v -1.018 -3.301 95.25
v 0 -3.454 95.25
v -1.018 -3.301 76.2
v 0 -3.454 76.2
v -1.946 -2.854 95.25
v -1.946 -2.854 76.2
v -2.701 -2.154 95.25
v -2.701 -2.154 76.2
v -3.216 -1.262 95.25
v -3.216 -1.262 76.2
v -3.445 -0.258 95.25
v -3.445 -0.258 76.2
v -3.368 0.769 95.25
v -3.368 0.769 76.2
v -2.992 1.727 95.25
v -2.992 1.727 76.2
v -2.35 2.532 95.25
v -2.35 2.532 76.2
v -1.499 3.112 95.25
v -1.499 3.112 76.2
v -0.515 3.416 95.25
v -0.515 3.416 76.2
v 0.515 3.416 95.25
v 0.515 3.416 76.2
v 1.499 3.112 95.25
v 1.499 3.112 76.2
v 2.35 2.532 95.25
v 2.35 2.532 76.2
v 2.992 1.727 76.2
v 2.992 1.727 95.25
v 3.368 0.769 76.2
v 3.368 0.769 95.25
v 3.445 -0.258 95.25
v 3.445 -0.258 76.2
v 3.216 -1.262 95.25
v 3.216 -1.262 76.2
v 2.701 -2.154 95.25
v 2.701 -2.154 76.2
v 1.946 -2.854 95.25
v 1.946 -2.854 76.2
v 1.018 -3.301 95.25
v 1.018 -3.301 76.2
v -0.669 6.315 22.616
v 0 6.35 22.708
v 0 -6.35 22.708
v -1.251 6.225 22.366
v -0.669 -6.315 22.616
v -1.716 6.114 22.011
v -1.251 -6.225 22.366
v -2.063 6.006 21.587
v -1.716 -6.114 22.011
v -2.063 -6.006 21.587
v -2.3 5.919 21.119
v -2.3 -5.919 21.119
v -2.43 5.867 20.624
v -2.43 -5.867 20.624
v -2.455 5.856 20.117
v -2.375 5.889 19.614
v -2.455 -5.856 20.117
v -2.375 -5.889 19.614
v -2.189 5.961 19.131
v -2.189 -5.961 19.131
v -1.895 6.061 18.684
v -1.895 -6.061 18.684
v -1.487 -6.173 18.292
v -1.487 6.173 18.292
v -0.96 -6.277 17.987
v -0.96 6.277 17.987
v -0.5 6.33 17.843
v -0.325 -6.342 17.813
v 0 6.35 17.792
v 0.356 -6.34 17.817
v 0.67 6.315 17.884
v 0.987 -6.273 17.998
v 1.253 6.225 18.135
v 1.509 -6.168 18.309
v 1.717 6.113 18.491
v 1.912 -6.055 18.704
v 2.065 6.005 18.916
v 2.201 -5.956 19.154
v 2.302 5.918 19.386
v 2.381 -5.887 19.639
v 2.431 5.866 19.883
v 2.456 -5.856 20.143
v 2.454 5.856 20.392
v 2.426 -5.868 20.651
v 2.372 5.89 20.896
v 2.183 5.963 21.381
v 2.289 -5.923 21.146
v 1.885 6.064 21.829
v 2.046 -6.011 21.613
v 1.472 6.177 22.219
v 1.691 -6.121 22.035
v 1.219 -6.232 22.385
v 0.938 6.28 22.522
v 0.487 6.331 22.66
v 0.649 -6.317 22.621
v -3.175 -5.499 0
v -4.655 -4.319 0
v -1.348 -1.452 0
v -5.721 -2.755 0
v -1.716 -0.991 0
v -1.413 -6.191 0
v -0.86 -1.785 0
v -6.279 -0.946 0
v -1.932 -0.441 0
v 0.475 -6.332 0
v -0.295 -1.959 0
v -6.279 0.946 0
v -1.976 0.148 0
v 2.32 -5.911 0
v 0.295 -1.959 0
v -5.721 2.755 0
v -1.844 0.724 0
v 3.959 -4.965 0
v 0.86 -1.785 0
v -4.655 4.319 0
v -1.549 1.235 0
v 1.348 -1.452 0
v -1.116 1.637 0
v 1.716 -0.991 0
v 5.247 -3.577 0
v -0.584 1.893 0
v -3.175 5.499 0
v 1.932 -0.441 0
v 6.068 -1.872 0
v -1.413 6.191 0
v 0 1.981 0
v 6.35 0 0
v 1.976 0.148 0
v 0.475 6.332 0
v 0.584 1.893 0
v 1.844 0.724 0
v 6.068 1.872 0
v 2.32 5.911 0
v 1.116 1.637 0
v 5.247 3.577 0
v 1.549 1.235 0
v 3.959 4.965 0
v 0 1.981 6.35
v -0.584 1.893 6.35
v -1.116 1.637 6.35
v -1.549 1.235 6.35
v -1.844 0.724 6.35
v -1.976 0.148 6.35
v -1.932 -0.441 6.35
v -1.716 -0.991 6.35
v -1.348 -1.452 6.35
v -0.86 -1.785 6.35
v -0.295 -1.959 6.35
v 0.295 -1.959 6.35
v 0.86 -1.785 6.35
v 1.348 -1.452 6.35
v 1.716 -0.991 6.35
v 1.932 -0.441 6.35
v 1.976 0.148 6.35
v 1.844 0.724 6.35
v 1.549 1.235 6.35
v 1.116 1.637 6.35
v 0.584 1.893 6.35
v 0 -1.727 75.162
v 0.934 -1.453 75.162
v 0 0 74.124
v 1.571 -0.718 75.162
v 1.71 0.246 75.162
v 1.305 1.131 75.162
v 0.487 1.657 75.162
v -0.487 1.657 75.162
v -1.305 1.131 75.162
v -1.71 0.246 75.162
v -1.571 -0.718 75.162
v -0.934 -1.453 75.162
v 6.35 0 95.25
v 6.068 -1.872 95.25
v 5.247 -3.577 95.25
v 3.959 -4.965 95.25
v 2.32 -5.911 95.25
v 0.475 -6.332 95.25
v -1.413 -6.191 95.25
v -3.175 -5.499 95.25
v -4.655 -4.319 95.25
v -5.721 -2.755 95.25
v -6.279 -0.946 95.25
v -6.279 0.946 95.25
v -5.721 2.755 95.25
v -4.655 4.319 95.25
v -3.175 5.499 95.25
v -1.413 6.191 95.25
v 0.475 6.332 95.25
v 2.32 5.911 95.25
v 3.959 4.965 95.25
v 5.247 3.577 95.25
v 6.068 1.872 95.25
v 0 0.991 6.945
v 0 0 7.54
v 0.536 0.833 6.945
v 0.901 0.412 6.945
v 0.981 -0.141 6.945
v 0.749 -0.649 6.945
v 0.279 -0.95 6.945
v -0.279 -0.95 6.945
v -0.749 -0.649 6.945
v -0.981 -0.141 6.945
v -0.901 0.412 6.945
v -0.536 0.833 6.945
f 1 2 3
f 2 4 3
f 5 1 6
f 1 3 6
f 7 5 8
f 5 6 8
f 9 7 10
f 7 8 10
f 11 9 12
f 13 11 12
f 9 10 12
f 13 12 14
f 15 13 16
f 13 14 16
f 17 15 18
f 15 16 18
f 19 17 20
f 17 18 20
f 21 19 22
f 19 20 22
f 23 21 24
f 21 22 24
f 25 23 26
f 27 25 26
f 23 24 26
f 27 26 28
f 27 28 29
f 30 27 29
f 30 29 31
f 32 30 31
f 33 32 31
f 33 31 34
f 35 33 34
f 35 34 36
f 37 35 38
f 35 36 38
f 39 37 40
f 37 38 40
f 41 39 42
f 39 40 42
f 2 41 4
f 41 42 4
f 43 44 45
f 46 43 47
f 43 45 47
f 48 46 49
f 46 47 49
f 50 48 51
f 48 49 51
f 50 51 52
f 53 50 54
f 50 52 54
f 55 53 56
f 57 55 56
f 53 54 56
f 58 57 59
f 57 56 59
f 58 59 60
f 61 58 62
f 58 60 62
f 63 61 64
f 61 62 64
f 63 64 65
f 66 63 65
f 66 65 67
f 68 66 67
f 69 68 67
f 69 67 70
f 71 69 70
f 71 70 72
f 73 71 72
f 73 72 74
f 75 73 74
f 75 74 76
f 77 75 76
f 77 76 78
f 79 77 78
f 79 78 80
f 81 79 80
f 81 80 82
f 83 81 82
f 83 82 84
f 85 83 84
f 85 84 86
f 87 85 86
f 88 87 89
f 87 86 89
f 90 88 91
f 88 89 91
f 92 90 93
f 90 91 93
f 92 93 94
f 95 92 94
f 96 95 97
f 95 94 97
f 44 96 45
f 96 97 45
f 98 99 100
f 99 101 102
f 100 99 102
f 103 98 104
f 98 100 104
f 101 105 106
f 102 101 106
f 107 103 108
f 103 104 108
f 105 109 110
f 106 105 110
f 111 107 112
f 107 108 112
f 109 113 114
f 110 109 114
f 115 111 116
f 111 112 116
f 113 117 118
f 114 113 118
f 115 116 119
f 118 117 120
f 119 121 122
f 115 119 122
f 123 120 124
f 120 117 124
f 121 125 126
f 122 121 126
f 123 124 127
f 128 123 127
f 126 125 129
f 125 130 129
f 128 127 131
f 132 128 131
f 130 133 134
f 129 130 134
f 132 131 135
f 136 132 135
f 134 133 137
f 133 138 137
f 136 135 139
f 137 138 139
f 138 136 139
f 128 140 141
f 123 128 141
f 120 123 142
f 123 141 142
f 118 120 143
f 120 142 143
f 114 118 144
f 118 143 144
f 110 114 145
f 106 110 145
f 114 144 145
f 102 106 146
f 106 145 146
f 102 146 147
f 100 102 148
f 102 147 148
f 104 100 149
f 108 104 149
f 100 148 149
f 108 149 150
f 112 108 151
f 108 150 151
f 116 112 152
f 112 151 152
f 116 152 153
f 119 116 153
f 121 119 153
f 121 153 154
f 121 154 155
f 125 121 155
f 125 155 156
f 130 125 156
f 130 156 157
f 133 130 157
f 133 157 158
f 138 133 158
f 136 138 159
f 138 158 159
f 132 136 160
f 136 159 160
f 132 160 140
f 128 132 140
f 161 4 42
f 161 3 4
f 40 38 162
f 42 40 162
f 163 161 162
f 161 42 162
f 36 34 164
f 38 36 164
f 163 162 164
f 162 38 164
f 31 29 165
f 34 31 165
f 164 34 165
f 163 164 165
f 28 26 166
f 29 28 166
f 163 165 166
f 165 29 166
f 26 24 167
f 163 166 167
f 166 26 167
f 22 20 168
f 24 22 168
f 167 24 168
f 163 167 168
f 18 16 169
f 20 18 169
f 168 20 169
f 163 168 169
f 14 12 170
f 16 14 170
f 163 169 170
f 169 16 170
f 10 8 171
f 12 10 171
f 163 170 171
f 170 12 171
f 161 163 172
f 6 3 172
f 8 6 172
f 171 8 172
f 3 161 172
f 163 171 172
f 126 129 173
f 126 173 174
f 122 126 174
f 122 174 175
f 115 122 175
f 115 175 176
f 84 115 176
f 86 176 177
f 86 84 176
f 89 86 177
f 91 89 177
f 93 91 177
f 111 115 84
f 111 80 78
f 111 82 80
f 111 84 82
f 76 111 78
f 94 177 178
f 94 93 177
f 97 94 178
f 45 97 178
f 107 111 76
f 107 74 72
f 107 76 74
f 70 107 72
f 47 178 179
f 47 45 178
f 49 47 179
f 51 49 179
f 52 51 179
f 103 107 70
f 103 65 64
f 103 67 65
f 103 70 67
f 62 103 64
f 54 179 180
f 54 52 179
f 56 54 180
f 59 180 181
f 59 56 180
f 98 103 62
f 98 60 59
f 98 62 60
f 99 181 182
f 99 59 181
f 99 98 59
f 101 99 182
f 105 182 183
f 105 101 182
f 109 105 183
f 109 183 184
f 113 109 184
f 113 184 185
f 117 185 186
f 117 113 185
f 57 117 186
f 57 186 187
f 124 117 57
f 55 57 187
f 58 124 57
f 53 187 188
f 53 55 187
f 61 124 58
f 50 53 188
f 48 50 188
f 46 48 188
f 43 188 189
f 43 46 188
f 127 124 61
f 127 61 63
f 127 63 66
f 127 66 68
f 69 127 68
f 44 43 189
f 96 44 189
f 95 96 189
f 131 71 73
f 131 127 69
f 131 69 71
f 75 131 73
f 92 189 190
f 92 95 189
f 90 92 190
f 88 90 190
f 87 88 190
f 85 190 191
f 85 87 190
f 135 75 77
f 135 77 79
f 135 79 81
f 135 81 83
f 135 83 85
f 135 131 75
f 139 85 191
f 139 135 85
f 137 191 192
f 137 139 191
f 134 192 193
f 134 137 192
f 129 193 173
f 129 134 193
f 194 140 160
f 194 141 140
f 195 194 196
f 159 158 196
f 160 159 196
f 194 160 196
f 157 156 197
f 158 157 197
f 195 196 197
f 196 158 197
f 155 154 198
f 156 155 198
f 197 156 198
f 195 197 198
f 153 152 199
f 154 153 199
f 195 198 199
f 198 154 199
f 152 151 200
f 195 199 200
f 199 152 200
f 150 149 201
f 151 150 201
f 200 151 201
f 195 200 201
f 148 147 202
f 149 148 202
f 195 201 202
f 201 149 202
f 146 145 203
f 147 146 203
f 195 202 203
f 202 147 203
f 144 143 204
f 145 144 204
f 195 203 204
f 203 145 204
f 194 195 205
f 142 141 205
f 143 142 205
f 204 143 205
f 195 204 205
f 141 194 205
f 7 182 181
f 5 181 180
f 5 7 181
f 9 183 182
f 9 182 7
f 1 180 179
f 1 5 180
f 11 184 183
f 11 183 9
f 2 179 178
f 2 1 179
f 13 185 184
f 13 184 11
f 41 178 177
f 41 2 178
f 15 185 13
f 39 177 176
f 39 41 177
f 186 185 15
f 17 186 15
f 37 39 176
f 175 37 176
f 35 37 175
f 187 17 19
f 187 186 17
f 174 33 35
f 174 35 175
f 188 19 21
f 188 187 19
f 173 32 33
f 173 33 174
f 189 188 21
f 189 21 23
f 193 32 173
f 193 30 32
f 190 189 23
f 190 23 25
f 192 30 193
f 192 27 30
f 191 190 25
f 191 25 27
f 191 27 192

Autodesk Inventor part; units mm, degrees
ref_plane "YZ Plane" through (0, 0, 0) normal (1, 0, 0) x (0, 1, 0)
ref_plane "XZ Plane" through (0, 0, 0) normal (0, 1, 0) x (-1, 0, 0)
sketch "Sketch1" plane through (0, 0, 0) normal (0, 0, 1) x (1, 0, 0)
  circle A0 centre (0, 0) radius 6.35
  dimension "d0" = 12.7
extrude "Extrusion1" add sketch "Sketch1" along normal blind 95.25
sketch "Sketch2" plane through (0, 0, 95.25) normal (0, 0, 1) x (1, 0, 0)
  circle A0 centre (0, 0) radius 6.35 projected
hole "Hole1" at (0, 0, 95.25) direction (0, 0, -1) diameter 6.9088 depth 19.05 tip angle 118 thread size "5/16-24 UNF" class "2B" standard "ANSI Unified Screw Threads"
ref_plane "Work Plane1" through (0, 6.35, 0) normal (0, 1, 0) x (-1, 0, 0)
sketch "Sketch3" plane through (0, 6.35, 0) normal (0, 1, 0) x (-1, 0, 0)
  line L0 (-6.35, 0) -> (6.35, 0) projected
  line L1 (-6.35, 95.25) -> (6.35, 95.25) projected
  line L2 (-6.35, 0) -> (6.35, 0) projected
  point P0 (0, 20.25)
  dimension "d18" = 75
hole "Hole2" at (0, 6.35, 20.25) direction (0, -1, 0) diameter 4.917 end through all thread size "M6x1" class "6H" standard "ISO Metric profile"
sketch "Sketch4" plane through (0, 0, 0) normal (0, 0, -1) x (-1, 0, 0)
  circle A0 centre (0, 0) radius 6.35 projected
hole "Hole3" at (0, 0, 0) direction (0, 0, 1) diameter 3.9624 depth 6.35 tip angle 118 thread size "10-32 UNF" class "2B" standard "ANSI Unified Screw Threads"
properties part number "PWTR-0037" material "Stainless Steel, 303"
